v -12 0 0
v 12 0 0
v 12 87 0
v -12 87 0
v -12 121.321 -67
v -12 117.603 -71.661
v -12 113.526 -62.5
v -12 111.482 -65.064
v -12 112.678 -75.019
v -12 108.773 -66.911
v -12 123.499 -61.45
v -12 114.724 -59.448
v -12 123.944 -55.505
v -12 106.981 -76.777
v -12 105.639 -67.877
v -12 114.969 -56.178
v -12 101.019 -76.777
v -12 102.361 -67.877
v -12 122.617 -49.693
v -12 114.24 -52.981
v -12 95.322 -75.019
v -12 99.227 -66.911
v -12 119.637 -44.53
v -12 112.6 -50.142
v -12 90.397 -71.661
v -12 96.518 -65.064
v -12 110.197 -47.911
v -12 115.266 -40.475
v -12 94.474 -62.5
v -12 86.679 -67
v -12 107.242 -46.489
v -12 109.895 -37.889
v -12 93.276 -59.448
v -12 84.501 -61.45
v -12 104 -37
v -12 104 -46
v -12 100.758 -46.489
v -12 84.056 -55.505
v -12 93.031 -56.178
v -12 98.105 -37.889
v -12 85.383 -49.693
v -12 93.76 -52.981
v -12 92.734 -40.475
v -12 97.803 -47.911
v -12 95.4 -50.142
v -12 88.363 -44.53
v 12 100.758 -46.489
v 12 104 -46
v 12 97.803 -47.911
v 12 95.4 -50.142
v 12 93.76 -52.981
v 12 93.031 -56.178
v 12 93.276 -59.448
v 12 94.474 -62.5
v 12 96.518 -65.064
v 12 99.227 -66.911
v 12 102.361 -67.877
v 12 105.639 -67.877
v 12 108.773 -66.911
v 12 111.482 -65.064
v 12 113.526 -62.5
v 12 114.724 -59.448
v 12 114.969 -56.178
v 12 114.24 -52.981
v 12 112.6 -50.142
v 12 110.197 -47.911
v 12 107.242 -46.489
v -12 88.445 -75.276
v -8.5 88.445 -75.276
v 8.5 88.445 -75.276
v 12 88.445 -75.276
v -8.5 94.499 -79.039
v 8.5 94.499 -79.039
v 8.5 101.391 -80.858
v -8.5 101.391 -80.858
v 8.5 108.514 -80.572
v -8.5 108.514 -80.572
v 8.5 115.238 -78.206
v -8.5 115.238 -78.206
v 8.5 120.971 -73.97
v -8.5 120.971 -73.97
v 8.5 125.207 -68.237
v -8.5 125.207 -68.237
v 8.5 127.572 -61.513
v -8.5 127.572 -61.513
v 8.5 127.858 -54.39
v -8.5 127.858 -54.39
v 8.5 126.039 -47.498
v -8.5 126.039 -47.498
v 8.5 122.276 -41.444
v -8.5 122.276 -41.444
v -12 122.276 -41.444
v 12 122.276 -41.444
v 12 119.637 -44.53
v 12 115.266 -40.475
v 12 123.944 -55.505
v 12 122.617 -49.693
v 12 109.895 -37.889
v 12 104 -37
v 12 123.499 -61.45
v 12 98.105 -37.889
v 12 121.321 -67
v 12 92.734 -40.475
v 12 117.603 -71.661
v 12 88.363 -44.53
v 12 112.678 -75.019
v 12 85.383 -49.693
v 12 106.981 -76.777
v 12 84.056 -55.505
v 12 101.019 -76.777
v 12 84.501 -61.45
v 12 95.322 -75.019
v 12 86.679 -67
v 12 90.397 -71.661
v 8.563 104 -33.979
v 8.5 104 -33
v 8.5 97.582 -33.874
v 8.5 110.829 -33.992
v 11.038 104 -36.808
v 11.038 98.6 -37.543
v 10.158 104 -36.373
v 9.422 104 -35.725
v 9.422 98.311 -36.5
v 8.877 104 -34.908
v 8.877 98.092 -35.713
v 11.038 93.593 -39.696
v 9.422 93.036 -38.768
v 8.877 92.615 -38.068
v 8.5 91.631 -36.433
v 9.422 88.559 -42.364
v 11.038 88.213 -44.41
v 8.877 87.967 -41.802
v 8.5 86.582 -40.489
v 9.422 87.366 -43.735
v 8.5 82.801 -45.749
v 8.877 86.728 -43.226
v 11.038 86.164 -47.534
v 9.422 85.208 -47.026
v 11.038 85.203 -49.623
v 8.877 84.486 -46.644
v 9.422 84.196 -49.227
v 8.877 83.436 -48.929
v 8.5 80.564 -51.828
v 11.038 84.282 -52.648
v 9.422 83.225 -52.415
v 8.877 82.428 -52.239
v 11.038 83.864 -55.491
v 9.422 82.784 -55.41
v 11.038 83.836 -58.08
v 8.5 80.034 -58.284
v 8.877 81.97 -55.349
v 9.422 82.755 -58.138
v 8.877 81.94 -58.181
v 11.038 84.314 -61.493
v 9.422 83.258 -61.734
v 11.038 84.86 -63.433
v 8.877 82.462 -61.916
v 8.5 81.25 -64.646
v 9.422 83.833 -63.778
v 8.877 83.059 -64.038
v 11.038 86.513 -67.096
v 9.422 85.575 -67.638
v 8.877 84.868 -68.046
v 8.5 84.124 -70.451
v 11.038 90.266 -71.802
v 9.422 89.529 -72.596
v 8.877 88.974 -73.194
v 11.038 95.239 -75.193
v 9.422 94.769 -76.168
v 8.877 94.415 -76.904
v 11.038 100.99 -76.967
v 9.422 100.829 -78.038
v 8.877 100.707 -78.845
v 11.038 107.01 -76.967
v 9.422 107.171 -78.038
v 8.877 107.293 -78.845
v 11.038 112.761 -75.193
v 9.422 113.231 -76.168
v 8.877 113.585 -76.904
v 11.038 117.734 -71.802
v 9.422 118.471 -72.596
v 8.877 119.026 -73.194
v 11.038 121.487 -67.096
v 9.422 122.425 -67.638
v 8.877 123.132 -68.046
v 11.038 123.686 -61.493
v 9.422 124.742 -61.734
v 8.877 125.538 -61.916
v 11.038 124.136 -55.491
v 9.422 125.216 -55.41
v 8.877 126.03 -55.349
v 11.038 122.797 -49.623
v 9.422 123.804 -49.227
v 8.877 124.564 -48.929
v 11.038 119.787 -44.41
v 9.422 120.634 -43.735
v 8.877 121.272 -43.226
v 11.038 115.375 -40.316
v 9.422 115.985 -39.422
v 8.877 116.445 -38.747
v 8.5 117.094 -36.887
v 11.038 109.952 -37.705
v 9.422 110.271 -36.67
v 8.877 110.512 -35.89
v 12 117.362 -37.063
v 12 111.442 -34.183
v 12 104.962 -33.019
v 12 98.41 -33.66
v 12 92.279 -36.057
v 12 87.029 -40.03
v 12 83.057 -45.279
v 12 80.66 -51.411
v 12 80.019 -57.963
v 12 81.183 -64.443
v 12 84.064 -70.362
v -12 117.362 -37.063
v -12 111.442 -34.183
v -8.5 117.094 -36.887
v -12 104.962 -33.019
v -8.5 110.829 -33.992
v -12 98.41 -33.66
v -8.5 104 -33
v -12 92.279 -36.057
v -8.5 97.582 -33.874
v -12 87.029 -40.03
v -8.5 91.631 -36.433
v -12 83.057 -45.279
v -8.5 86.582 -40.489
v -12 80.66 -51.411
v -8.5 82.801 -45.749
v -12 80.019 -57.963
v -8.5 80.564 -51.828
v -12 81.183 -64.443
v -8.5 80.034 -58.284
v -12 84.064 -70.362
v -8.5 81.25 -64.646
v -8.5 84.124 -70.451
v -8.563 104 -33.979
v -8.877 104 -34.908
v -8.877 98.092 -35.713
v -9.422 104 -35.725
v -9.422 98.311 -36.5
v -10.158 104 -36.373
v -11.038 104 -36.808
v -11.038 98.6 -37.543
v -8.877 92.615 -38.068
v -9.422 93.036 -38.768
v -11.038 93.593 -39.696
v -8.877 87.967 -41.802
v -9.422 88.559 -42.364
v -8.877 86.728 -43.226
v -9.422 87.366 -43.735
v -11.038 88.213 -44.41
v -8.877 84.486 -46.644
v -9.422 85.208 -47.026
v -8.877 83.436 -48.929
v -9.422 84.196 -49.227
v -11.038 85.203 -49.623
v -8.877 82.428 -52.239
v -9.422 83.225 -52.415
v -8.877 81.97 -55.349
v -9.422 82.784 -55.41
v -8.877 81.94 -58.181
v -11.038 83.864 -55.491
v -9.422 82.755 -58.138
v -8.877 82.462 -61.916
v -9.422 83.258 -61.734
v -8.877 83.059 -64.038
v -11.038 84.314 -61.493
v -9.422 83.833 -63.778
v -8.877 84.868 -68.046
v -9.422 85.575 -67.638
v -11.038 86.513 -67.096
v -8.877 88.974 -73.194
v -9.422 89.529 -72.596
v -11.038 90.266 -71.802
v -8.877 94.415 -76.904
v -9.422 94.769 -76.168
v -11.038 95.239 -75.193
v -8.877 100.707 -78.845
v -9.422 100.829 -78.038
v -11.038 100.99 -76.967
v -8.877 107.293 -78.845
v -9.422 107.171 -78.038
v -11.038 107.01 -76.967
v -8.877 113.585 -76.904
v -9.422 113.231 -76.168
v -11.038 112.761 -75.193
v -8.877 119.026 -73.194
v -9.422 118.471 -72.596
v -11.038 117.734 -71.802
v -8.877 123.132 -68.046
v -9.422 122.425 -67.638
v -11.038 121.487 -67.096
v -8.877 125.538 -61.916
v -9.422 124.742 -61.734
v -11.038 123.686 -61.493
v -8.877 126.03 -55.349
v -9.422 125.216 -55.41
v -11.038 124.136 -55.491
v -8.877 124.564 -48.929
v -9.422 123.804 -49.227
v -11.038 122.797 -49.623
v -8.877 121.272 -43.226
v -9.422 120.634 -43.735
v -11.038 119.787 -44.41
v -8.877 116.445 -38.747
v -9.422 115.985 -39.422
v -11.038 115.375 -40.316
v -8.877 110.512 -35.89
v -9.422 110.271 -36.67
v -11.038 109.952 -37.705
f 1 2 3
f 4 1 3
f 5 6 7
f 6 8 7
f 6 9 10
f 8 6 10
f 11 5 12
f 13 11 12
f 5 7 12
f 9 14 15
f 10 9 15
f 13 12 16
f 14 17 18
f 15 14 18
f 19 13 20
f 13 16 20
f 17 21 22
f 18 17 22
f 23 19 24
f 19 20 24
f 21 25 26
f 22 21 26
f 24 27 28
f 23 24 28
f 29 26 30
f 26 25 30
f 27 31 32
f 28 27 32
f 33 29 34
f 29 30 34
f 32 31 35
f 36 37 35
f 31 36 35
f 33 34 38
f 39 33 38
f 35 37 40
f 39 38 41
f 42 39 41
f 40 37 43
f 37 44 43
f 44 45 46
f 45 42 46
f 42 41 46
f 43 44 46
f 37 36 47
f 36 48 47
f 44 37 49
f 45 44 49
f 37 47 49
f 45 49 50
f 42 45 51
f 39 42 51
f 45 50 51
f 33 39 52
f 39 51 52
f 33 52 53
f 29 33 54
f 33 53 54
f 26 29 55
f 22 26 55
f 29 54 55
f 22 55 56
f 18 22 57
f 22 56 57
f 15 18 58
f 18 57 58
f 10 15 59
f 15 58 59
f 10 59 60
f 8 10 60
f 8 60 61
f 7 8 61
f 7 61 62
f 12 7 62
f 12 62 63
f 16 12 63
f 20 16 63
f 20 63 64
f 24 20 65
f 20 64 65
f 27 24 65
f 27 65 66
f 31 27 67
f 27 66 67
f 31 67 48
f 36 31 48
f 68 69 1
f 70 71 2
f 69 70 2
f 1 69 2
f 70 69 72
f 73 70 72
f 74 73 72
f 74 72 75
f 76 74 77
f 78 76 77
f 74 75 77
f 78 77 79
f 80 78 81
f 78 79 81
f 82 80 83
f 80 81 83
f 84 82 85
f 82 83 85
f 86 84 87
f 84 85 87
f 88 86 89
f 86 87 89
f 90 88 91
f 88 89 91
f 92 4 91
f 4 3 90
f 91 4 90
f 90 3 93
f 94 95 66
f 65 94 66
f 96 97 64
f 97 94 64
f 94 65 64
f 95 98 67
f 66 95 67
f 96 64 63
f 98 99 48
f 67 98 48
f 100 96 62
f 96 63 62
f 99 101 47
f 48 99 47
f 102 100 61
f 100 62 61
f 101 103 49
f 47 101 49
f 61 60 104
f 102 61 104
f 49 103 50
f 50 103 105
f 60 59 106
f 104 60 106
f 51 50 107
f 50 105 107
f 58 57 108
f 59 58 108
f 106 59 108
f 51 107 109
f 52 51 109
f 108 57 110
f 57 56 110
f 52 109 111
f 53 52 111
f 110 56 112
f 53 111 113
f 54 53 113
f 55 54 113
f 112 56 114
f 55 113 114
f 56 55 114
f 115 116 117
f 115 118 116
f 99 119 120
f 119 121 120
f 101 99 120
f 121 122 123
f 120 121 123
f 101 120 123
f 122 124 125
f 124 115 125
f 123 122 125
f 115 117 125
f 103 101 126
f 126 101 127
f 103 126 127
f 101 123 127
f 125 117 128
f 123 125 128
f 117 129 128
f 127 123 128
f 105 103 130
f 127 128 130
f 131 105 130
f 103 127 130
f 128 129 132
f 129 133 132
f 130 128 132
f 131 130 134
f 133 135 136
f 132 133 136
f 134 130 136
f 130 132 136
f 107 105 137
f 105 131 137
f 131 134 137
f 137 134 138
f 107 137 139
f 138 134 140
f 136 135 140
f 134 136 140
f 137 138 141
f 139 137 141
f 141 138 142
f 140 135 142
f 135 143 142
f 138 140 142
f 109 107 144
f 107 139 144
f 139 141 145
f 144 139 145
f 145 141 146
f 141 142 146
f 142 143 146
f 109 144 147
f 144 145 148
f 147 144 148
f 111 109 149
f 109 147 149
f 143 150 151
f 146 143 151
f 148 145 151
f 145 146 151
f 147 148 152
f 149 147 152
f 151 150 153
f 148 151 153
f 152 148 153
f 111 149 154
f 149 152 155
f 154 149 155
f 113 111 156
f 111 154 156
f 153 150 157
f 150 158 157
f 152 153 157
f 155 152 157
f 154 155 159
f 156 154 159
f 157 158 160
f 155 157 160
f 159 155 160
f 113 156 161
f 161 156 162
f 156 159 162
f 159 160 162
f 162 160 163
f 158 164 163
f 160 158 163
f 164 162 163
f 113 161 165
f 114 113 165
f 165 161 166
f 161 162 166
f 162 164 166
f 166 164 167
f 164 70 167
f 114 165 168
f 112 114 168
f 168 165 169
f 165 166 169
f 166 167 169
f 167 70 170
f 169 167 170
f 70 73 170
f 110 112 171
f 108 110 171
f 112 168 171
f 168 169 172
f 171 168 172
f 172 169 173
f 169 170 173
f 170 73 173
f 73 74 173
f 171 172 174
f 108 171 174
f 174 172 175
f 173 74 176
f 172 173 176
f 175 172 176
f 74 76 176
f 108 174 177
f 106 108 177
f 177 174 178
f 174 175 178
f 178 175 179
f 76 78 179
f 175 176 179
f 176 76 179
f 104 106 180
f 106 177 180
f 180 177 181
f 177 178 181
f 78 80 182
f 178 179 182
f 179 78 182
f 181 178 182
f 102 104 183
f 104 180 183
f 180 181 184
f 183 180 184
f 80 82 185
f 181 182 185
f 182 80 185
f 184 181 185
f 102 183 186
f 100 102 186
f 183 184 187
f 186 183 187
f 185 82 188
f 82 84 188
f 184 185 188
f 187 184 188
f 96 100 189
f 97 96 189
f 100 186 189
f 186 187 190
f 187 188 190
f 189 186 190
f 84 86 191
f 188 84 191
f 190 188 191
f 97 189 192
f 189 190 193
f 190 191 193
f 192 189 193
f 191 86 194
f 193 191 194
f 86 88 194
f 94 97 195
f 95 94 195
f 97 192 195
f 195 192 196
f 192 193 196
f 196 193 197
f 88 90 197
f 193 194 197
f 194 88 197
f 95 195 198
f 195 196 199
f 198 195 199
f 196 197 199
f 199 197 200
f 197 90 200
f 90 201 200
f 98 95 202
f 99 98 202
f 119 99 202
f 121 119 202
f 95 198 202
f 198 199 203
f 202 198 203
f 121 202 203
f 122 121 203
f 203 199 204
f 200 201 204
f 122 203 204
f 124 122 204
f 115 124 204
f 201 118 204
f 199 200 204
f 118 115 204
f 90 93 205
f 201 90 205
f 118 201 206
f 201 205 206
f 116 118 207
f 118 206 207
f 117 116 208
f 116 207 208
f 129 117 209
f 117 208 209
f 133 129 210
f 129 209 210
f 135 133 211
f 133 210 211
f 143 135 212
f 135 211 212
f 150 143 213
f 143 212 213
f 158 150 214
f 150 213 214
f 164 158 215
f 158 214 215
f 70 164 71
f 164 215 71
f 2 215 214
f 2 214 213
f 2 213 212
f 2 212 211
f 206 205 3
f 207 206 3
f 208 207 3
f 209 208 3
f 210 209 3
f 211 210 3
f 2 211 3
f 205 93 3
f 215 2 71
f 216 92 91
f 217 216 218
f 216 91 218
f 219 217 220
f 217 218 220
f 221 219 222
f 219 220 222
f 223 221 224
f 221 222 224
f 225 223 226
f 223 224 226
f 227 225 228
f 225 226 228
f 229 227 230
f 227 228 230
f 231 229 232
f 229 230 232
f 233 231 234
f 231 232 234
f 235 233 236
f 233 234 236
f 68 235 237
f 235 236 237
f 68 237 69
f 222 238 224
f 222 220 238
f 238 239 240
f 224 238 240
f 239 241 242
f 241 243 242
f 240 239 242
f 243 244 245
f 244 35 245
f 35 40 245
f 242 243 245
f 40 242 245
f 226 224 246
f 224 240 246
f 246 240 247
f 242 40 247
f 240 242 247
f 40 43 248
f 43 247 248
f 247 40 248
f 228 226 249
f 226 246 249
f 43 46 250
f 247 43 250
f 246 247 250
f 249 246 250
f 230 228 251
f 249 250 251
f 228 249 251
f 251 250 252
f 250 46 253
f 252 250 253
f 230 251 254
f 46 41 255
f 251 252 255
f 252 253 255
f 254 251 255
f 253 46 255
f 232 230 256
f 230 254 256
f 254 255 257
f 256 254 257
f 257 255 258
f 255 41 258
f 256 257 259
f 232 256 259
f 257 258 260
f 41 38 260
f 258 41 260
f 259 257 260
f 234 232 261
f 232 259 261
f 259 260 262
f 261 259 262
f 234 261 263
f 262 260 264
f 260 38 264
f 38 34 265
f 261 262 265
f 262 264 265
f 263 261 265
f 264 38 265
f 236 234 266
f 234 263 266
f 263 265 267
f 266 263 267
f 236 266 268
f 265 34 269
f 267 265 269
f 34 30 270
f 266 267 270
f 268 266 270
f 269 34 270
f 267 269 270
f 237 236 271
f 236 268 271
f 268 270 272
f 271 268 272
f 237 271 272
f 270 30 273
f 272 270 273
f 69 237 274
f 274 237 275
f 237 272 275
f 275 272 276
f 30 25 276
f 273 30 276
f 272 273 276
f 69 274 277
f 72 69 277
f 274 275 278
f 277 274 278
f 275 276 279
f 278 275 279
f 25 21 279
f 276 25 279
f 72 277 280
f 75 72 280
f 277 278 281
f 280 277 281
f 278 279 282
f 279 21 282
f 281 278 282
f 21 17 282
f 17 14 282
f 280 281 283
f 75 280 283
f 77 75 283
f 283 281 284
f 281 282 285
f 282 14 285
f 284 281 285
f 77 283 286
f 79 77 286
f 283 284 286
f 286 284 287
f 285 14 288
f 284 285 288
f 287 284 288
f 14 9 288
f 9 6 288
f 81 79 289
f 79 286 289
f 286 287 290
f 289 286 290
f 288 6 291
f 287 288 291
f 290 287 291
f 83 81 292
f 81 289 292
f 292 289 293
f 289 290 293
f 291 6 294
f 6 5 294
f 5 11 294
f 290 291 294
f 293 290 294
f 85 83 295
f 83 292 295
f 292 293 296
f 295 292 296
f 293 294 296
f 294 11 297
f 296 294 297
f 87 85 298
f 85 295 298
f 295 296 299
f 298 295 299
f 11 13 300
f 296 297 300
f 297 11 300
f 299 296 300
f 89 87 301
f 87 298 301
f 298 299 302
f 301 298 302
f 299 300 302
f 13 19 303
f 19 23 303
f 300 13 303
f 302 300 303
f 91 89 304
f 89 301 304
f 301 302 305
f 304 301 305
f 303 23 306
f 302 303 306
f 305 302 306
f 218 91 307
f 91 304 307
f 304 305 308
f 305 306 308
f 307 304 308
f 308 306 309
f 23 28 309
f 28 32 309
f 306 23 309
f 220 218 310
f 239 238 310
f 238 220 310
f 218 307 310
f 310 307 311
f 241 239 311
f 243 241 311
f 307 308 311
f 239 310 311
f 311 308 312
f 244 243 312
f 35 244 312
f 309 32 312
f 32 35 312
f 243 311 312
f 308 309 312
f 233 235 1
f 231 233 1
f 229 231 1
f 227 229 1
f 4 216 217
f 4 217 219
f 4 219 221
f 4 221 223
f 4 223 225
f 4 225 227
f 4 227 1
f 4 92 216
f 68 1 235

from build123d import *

# Parameters (mm, degrees)
BOSS_EXTRUDE1_DEPTH = 12


with BuildPart() as part:
    # Sketch2 → Revolve1 (revolve)
    with BuildSketch(Plane.XY.offset(-57), mode=Mode.PRIVATE) as revolve1_sk:
        with BuildLine():
            Line((-12, 115), (12, 115))
            Line((12, 115), (12, 124))
            ThreePointArc((12, 124), (9.421572875, 125.275126266), (8.5, 128))
            Line((8.5, 128), (-8.5, 128))
            ThreePointArc((-8.5, 128), (-9.421572875, 125.275126266), (-12, 124))
            Line((-12, 124), (-12, 115))
        make_face()
    revolve(revolve1_sk.sketch.rotate(Axis((-36.047482345, 104, -57), (1, 0, 0)), 90), axis=Axis((-36.047482345, 104, -57), (1, 0, 0)))

    # Sketch3 → Boss-Extrude1 (add, symmetric)
    with BuildSketch(Plane(origin=(0, 0, 0), x_dir=(0, 0, -1), z_dir=(1, 0, 0))):
        with BuildLine():
            Line((0, 0), (0, 87))
            Line((0, 87), (41.444008538, 122.275971373))
            ThreePointArc((41.444008538, 122.275971373), (40.02971958, 87.029154927), (75.276488949, 88.444616633))
            Line((75.276488949, 88.444616633), (0, 0))
        make_face()
    extrude(amount=BOSS_EXTRUDE1_DEPTH, both=True)


solid = part.part
